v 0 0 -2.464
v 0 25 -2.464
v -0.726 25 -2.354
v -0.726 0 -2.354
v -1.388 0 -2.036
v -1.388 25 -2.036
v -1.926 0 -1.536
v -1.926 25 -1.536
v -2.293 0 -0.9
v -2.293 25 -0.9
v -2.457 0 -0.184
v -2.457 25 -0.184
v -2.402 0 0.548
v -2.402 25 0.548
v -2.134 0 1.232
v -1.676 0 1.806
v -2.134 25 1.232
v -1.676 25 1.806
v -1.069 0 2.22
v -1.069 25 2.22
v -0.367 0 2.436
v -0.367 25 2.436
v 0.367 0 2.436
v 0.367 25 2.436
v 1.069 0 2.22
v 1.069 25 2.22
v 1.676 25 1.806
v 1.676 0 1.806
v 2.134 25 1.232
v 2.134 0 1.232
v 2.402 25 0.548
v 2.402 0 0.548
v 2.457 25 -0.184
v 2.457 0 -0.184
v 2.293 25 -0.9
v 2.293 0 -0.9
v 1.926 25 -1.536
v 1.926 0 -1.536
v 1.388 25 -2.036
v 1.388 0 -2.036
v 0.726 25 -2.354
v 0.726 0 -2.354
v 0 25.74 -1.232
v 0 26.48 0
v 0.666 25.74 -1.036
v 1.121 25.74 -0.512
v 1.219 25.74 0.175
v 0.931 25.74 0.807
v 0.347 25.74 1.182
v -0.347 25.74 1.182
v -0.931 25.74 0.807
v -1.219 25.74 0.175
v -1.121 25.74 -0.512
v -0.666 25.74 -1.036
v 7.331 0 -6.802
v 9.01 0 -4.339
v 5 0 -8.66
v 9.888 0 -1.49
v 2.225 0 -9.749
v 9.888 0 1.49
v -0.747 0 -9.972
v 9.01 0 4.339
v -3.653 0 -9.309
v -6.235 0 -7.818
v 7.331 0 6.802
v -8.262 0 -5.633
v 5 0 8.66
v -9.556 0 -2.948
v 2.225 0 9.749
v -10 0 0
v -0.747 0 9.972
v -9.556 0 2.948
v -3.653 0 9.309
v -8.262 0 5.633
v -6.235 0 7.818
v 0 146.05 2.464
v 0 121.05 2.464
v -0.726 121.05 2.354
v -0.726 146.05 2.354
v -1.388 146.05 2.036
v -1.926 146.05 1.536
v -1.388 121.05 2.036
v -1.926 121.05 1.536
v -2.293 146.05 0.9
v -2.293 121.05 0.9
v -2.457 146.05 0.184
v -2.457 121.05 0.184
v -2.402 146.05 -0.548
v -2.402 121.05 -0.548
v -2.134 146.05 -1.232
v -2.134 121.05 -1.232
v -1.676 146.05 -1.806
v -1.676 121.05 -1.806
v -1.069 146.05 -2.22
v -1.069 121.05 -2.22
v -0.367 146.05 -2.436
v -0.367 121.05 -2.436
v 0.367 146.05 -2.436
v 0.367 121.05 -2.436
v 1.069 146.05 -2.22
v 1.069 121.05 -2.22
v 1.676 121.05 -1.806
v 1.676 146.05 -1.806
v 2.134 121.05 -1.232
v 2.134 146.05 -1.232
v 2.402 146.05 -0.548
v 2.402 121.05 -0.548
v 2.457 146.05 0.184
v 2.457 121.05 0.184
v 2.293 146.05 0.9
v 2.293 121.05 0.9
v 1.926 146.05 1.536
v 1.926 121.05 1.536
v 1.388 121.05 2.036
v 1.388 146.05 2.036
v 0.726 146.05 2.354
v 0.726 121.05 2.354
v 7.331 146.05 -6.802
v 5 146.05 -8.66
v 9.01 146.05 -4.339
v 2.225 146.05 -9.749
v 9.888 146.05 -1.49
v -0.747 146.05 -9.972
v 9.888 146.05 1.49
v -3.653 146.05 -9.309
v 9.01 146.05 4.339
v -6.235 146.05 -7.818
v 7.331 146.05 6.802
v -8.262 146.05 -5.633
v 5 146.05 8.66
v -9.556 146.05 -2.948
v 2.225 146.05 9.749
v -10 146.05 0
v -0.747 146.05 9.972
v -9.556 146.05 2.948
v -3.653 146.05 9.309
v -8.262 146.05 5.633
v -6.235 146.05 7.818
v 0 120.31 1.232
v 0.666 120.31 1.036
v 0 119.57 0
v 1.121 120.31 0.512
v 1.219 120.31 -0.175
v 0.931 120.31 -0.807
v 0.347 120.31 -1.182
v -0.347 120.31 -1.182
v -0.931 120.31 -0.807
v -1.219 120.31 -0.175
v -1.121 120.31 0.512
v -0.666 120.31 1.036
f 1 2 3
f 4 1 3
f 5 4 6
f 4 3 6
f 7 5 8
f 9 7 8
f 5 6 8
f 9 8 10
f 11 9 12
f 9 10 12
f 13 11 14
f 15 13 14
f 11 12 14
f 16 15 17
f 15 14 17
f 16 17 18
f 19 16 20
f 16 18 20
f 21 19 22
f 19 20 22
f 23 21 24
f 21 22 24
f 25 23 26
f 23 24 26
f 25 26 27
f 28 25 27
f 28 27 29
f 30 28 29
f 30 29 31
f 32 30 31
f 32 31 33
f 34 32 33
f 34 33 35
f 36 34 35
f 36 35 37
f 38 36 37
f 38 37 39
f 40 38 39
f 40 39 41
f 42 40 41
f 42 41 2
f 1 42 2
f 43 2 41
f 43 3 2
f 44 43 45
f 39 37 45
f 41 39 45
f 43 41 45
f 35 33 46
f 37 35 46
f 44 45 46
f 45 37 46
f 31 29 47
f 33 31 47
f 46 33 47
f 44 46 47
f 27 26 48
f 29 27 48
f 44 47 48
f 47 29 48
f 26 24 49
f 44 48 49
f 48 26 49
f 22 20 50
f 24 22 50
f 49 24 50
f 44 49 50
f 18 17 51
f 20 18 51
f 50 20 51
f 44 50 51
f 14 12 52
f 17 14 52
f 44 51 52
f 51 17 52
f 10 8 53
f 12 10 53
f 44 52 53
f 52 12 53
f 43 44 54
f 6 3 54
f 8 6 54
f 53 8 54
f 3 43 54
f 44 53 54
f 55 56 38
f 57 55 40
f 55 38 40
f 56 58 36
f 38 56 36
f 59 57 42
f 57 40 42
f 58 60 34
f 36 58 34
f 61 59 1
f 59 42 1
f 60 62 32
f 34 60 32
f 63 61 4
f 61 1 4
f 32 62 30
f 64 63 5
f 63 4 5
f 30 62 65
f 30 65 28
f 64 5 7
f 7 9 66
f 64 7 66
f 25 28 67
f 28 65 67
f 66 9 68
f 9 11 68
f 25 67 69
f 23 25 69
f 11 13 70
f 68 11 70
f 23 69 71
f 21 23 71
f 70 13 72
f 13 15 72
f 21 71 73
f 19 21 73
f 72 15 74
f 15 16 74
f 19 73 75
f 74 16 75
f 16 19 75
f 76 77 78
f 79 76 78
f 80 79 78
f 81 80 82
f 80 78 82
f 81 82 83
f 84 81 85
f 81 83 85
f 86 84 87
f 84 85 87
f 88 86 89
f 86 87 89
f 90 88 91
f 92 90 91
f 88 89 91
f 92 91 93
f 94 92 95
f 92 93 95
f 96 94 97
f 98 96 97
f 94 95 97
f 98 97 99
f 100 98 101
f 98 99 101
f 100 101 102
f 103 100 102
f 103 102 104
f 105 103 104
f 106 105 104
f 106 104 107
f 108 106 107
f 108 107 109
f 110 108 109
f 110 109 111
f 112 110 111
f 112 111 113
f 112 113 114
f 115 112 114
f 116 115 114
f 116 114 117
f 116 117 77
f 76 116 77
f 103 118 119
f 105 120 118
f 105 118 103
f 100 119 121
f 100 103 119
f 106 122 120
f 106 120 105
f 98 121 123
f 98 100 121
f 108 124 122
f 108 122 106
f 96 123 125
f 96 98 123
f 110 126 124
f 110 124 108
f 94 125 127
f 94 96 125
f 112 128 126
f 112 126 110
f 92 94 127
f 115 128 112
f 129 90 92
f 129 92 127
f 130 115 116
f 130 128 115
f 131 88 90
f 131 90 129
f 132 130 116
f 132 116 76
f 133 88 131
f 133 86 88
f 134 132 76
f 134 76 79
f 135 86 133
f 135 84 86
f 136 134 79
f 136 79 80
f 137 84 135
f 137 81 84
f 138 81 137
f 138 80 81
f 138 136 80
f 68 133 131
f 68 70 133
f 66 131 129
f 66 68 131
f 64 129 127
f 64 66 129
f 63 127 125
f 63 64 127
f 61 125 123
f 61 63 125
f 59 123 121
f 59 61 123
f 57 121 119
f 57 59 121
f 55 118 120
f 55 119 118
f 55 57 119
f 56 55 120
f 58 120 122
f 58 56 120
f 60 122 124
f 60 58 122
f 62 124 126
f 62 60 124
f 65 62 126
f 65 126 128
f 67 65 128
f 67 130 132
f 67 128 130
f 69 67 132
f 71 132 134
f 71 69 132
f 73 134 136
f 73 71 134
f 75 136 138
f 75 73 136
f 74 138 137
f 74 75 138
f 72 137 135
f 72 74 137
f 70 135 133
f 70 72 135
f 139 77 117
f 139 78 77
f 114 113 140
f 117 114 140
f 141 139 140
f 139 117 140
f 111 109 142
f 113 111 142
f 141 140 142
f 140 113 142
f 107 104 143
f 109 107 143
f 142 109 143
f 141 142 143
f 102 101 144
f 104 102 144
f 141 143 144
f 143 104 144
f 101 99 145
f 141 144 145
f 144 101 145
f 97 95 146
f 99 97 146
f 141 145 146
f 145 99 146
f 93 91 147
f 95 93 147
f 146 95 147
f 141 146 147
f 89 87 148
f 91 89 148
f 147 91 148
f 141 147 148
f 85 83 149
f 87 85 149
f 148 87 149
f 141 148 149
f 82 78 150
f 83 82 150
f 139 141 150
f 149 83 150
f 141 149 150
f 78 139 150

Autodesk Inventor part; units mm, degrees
ref_plane "YZ Plane" through (0, 0, 0) normal (1, 0, 0) x (0, 1, 0)
ref_plane "XZ Plane" through (0, 0, 0) normal (0, 1, 0) x (-1, 0, 0)
ref_plane "XY Plane" through (0, 0, 0) normal (0, 0, 1) x (1, 0, 0)
sketch "Sketch1" plane through (0, 0, 0) normal (0, 1, 0) x (-1, 0, 0)
  circle A0 centre (0, 0) radius 10
  dimension "d0" = 20
extrude "Extrusion1" add sketch "Sketch1" along normal blind 146.05
sketch "Sketch2" plane through (0, 146.05, 0) normal (0, 1, 0) x (1, 0, 0)
  circle A0 centre (0, 0) radius 10 projected
  circle A1 centre (0, 0) radius 1.7528
hole "Hole1" at (0, 146.05, 0) direction (0, -1, 0) diameter 4.9276 depth 25 tip angle 118
sketch "Sketch3" plane through (0, 0, 0) normal (0, -1, 0) x (1, 0, 0)
  circle A0 centre (0, 0) radius 10 projected
  circle A1 centre (0, 0) radius 2.7242
hole "Hole2" at (0, 0, 0) direction (0, 1, 0) diameter 4.9276 depth 25 tip angle 118
properties part number "dipoleDiscSpacer_B" material "Acetal Resin, White"
